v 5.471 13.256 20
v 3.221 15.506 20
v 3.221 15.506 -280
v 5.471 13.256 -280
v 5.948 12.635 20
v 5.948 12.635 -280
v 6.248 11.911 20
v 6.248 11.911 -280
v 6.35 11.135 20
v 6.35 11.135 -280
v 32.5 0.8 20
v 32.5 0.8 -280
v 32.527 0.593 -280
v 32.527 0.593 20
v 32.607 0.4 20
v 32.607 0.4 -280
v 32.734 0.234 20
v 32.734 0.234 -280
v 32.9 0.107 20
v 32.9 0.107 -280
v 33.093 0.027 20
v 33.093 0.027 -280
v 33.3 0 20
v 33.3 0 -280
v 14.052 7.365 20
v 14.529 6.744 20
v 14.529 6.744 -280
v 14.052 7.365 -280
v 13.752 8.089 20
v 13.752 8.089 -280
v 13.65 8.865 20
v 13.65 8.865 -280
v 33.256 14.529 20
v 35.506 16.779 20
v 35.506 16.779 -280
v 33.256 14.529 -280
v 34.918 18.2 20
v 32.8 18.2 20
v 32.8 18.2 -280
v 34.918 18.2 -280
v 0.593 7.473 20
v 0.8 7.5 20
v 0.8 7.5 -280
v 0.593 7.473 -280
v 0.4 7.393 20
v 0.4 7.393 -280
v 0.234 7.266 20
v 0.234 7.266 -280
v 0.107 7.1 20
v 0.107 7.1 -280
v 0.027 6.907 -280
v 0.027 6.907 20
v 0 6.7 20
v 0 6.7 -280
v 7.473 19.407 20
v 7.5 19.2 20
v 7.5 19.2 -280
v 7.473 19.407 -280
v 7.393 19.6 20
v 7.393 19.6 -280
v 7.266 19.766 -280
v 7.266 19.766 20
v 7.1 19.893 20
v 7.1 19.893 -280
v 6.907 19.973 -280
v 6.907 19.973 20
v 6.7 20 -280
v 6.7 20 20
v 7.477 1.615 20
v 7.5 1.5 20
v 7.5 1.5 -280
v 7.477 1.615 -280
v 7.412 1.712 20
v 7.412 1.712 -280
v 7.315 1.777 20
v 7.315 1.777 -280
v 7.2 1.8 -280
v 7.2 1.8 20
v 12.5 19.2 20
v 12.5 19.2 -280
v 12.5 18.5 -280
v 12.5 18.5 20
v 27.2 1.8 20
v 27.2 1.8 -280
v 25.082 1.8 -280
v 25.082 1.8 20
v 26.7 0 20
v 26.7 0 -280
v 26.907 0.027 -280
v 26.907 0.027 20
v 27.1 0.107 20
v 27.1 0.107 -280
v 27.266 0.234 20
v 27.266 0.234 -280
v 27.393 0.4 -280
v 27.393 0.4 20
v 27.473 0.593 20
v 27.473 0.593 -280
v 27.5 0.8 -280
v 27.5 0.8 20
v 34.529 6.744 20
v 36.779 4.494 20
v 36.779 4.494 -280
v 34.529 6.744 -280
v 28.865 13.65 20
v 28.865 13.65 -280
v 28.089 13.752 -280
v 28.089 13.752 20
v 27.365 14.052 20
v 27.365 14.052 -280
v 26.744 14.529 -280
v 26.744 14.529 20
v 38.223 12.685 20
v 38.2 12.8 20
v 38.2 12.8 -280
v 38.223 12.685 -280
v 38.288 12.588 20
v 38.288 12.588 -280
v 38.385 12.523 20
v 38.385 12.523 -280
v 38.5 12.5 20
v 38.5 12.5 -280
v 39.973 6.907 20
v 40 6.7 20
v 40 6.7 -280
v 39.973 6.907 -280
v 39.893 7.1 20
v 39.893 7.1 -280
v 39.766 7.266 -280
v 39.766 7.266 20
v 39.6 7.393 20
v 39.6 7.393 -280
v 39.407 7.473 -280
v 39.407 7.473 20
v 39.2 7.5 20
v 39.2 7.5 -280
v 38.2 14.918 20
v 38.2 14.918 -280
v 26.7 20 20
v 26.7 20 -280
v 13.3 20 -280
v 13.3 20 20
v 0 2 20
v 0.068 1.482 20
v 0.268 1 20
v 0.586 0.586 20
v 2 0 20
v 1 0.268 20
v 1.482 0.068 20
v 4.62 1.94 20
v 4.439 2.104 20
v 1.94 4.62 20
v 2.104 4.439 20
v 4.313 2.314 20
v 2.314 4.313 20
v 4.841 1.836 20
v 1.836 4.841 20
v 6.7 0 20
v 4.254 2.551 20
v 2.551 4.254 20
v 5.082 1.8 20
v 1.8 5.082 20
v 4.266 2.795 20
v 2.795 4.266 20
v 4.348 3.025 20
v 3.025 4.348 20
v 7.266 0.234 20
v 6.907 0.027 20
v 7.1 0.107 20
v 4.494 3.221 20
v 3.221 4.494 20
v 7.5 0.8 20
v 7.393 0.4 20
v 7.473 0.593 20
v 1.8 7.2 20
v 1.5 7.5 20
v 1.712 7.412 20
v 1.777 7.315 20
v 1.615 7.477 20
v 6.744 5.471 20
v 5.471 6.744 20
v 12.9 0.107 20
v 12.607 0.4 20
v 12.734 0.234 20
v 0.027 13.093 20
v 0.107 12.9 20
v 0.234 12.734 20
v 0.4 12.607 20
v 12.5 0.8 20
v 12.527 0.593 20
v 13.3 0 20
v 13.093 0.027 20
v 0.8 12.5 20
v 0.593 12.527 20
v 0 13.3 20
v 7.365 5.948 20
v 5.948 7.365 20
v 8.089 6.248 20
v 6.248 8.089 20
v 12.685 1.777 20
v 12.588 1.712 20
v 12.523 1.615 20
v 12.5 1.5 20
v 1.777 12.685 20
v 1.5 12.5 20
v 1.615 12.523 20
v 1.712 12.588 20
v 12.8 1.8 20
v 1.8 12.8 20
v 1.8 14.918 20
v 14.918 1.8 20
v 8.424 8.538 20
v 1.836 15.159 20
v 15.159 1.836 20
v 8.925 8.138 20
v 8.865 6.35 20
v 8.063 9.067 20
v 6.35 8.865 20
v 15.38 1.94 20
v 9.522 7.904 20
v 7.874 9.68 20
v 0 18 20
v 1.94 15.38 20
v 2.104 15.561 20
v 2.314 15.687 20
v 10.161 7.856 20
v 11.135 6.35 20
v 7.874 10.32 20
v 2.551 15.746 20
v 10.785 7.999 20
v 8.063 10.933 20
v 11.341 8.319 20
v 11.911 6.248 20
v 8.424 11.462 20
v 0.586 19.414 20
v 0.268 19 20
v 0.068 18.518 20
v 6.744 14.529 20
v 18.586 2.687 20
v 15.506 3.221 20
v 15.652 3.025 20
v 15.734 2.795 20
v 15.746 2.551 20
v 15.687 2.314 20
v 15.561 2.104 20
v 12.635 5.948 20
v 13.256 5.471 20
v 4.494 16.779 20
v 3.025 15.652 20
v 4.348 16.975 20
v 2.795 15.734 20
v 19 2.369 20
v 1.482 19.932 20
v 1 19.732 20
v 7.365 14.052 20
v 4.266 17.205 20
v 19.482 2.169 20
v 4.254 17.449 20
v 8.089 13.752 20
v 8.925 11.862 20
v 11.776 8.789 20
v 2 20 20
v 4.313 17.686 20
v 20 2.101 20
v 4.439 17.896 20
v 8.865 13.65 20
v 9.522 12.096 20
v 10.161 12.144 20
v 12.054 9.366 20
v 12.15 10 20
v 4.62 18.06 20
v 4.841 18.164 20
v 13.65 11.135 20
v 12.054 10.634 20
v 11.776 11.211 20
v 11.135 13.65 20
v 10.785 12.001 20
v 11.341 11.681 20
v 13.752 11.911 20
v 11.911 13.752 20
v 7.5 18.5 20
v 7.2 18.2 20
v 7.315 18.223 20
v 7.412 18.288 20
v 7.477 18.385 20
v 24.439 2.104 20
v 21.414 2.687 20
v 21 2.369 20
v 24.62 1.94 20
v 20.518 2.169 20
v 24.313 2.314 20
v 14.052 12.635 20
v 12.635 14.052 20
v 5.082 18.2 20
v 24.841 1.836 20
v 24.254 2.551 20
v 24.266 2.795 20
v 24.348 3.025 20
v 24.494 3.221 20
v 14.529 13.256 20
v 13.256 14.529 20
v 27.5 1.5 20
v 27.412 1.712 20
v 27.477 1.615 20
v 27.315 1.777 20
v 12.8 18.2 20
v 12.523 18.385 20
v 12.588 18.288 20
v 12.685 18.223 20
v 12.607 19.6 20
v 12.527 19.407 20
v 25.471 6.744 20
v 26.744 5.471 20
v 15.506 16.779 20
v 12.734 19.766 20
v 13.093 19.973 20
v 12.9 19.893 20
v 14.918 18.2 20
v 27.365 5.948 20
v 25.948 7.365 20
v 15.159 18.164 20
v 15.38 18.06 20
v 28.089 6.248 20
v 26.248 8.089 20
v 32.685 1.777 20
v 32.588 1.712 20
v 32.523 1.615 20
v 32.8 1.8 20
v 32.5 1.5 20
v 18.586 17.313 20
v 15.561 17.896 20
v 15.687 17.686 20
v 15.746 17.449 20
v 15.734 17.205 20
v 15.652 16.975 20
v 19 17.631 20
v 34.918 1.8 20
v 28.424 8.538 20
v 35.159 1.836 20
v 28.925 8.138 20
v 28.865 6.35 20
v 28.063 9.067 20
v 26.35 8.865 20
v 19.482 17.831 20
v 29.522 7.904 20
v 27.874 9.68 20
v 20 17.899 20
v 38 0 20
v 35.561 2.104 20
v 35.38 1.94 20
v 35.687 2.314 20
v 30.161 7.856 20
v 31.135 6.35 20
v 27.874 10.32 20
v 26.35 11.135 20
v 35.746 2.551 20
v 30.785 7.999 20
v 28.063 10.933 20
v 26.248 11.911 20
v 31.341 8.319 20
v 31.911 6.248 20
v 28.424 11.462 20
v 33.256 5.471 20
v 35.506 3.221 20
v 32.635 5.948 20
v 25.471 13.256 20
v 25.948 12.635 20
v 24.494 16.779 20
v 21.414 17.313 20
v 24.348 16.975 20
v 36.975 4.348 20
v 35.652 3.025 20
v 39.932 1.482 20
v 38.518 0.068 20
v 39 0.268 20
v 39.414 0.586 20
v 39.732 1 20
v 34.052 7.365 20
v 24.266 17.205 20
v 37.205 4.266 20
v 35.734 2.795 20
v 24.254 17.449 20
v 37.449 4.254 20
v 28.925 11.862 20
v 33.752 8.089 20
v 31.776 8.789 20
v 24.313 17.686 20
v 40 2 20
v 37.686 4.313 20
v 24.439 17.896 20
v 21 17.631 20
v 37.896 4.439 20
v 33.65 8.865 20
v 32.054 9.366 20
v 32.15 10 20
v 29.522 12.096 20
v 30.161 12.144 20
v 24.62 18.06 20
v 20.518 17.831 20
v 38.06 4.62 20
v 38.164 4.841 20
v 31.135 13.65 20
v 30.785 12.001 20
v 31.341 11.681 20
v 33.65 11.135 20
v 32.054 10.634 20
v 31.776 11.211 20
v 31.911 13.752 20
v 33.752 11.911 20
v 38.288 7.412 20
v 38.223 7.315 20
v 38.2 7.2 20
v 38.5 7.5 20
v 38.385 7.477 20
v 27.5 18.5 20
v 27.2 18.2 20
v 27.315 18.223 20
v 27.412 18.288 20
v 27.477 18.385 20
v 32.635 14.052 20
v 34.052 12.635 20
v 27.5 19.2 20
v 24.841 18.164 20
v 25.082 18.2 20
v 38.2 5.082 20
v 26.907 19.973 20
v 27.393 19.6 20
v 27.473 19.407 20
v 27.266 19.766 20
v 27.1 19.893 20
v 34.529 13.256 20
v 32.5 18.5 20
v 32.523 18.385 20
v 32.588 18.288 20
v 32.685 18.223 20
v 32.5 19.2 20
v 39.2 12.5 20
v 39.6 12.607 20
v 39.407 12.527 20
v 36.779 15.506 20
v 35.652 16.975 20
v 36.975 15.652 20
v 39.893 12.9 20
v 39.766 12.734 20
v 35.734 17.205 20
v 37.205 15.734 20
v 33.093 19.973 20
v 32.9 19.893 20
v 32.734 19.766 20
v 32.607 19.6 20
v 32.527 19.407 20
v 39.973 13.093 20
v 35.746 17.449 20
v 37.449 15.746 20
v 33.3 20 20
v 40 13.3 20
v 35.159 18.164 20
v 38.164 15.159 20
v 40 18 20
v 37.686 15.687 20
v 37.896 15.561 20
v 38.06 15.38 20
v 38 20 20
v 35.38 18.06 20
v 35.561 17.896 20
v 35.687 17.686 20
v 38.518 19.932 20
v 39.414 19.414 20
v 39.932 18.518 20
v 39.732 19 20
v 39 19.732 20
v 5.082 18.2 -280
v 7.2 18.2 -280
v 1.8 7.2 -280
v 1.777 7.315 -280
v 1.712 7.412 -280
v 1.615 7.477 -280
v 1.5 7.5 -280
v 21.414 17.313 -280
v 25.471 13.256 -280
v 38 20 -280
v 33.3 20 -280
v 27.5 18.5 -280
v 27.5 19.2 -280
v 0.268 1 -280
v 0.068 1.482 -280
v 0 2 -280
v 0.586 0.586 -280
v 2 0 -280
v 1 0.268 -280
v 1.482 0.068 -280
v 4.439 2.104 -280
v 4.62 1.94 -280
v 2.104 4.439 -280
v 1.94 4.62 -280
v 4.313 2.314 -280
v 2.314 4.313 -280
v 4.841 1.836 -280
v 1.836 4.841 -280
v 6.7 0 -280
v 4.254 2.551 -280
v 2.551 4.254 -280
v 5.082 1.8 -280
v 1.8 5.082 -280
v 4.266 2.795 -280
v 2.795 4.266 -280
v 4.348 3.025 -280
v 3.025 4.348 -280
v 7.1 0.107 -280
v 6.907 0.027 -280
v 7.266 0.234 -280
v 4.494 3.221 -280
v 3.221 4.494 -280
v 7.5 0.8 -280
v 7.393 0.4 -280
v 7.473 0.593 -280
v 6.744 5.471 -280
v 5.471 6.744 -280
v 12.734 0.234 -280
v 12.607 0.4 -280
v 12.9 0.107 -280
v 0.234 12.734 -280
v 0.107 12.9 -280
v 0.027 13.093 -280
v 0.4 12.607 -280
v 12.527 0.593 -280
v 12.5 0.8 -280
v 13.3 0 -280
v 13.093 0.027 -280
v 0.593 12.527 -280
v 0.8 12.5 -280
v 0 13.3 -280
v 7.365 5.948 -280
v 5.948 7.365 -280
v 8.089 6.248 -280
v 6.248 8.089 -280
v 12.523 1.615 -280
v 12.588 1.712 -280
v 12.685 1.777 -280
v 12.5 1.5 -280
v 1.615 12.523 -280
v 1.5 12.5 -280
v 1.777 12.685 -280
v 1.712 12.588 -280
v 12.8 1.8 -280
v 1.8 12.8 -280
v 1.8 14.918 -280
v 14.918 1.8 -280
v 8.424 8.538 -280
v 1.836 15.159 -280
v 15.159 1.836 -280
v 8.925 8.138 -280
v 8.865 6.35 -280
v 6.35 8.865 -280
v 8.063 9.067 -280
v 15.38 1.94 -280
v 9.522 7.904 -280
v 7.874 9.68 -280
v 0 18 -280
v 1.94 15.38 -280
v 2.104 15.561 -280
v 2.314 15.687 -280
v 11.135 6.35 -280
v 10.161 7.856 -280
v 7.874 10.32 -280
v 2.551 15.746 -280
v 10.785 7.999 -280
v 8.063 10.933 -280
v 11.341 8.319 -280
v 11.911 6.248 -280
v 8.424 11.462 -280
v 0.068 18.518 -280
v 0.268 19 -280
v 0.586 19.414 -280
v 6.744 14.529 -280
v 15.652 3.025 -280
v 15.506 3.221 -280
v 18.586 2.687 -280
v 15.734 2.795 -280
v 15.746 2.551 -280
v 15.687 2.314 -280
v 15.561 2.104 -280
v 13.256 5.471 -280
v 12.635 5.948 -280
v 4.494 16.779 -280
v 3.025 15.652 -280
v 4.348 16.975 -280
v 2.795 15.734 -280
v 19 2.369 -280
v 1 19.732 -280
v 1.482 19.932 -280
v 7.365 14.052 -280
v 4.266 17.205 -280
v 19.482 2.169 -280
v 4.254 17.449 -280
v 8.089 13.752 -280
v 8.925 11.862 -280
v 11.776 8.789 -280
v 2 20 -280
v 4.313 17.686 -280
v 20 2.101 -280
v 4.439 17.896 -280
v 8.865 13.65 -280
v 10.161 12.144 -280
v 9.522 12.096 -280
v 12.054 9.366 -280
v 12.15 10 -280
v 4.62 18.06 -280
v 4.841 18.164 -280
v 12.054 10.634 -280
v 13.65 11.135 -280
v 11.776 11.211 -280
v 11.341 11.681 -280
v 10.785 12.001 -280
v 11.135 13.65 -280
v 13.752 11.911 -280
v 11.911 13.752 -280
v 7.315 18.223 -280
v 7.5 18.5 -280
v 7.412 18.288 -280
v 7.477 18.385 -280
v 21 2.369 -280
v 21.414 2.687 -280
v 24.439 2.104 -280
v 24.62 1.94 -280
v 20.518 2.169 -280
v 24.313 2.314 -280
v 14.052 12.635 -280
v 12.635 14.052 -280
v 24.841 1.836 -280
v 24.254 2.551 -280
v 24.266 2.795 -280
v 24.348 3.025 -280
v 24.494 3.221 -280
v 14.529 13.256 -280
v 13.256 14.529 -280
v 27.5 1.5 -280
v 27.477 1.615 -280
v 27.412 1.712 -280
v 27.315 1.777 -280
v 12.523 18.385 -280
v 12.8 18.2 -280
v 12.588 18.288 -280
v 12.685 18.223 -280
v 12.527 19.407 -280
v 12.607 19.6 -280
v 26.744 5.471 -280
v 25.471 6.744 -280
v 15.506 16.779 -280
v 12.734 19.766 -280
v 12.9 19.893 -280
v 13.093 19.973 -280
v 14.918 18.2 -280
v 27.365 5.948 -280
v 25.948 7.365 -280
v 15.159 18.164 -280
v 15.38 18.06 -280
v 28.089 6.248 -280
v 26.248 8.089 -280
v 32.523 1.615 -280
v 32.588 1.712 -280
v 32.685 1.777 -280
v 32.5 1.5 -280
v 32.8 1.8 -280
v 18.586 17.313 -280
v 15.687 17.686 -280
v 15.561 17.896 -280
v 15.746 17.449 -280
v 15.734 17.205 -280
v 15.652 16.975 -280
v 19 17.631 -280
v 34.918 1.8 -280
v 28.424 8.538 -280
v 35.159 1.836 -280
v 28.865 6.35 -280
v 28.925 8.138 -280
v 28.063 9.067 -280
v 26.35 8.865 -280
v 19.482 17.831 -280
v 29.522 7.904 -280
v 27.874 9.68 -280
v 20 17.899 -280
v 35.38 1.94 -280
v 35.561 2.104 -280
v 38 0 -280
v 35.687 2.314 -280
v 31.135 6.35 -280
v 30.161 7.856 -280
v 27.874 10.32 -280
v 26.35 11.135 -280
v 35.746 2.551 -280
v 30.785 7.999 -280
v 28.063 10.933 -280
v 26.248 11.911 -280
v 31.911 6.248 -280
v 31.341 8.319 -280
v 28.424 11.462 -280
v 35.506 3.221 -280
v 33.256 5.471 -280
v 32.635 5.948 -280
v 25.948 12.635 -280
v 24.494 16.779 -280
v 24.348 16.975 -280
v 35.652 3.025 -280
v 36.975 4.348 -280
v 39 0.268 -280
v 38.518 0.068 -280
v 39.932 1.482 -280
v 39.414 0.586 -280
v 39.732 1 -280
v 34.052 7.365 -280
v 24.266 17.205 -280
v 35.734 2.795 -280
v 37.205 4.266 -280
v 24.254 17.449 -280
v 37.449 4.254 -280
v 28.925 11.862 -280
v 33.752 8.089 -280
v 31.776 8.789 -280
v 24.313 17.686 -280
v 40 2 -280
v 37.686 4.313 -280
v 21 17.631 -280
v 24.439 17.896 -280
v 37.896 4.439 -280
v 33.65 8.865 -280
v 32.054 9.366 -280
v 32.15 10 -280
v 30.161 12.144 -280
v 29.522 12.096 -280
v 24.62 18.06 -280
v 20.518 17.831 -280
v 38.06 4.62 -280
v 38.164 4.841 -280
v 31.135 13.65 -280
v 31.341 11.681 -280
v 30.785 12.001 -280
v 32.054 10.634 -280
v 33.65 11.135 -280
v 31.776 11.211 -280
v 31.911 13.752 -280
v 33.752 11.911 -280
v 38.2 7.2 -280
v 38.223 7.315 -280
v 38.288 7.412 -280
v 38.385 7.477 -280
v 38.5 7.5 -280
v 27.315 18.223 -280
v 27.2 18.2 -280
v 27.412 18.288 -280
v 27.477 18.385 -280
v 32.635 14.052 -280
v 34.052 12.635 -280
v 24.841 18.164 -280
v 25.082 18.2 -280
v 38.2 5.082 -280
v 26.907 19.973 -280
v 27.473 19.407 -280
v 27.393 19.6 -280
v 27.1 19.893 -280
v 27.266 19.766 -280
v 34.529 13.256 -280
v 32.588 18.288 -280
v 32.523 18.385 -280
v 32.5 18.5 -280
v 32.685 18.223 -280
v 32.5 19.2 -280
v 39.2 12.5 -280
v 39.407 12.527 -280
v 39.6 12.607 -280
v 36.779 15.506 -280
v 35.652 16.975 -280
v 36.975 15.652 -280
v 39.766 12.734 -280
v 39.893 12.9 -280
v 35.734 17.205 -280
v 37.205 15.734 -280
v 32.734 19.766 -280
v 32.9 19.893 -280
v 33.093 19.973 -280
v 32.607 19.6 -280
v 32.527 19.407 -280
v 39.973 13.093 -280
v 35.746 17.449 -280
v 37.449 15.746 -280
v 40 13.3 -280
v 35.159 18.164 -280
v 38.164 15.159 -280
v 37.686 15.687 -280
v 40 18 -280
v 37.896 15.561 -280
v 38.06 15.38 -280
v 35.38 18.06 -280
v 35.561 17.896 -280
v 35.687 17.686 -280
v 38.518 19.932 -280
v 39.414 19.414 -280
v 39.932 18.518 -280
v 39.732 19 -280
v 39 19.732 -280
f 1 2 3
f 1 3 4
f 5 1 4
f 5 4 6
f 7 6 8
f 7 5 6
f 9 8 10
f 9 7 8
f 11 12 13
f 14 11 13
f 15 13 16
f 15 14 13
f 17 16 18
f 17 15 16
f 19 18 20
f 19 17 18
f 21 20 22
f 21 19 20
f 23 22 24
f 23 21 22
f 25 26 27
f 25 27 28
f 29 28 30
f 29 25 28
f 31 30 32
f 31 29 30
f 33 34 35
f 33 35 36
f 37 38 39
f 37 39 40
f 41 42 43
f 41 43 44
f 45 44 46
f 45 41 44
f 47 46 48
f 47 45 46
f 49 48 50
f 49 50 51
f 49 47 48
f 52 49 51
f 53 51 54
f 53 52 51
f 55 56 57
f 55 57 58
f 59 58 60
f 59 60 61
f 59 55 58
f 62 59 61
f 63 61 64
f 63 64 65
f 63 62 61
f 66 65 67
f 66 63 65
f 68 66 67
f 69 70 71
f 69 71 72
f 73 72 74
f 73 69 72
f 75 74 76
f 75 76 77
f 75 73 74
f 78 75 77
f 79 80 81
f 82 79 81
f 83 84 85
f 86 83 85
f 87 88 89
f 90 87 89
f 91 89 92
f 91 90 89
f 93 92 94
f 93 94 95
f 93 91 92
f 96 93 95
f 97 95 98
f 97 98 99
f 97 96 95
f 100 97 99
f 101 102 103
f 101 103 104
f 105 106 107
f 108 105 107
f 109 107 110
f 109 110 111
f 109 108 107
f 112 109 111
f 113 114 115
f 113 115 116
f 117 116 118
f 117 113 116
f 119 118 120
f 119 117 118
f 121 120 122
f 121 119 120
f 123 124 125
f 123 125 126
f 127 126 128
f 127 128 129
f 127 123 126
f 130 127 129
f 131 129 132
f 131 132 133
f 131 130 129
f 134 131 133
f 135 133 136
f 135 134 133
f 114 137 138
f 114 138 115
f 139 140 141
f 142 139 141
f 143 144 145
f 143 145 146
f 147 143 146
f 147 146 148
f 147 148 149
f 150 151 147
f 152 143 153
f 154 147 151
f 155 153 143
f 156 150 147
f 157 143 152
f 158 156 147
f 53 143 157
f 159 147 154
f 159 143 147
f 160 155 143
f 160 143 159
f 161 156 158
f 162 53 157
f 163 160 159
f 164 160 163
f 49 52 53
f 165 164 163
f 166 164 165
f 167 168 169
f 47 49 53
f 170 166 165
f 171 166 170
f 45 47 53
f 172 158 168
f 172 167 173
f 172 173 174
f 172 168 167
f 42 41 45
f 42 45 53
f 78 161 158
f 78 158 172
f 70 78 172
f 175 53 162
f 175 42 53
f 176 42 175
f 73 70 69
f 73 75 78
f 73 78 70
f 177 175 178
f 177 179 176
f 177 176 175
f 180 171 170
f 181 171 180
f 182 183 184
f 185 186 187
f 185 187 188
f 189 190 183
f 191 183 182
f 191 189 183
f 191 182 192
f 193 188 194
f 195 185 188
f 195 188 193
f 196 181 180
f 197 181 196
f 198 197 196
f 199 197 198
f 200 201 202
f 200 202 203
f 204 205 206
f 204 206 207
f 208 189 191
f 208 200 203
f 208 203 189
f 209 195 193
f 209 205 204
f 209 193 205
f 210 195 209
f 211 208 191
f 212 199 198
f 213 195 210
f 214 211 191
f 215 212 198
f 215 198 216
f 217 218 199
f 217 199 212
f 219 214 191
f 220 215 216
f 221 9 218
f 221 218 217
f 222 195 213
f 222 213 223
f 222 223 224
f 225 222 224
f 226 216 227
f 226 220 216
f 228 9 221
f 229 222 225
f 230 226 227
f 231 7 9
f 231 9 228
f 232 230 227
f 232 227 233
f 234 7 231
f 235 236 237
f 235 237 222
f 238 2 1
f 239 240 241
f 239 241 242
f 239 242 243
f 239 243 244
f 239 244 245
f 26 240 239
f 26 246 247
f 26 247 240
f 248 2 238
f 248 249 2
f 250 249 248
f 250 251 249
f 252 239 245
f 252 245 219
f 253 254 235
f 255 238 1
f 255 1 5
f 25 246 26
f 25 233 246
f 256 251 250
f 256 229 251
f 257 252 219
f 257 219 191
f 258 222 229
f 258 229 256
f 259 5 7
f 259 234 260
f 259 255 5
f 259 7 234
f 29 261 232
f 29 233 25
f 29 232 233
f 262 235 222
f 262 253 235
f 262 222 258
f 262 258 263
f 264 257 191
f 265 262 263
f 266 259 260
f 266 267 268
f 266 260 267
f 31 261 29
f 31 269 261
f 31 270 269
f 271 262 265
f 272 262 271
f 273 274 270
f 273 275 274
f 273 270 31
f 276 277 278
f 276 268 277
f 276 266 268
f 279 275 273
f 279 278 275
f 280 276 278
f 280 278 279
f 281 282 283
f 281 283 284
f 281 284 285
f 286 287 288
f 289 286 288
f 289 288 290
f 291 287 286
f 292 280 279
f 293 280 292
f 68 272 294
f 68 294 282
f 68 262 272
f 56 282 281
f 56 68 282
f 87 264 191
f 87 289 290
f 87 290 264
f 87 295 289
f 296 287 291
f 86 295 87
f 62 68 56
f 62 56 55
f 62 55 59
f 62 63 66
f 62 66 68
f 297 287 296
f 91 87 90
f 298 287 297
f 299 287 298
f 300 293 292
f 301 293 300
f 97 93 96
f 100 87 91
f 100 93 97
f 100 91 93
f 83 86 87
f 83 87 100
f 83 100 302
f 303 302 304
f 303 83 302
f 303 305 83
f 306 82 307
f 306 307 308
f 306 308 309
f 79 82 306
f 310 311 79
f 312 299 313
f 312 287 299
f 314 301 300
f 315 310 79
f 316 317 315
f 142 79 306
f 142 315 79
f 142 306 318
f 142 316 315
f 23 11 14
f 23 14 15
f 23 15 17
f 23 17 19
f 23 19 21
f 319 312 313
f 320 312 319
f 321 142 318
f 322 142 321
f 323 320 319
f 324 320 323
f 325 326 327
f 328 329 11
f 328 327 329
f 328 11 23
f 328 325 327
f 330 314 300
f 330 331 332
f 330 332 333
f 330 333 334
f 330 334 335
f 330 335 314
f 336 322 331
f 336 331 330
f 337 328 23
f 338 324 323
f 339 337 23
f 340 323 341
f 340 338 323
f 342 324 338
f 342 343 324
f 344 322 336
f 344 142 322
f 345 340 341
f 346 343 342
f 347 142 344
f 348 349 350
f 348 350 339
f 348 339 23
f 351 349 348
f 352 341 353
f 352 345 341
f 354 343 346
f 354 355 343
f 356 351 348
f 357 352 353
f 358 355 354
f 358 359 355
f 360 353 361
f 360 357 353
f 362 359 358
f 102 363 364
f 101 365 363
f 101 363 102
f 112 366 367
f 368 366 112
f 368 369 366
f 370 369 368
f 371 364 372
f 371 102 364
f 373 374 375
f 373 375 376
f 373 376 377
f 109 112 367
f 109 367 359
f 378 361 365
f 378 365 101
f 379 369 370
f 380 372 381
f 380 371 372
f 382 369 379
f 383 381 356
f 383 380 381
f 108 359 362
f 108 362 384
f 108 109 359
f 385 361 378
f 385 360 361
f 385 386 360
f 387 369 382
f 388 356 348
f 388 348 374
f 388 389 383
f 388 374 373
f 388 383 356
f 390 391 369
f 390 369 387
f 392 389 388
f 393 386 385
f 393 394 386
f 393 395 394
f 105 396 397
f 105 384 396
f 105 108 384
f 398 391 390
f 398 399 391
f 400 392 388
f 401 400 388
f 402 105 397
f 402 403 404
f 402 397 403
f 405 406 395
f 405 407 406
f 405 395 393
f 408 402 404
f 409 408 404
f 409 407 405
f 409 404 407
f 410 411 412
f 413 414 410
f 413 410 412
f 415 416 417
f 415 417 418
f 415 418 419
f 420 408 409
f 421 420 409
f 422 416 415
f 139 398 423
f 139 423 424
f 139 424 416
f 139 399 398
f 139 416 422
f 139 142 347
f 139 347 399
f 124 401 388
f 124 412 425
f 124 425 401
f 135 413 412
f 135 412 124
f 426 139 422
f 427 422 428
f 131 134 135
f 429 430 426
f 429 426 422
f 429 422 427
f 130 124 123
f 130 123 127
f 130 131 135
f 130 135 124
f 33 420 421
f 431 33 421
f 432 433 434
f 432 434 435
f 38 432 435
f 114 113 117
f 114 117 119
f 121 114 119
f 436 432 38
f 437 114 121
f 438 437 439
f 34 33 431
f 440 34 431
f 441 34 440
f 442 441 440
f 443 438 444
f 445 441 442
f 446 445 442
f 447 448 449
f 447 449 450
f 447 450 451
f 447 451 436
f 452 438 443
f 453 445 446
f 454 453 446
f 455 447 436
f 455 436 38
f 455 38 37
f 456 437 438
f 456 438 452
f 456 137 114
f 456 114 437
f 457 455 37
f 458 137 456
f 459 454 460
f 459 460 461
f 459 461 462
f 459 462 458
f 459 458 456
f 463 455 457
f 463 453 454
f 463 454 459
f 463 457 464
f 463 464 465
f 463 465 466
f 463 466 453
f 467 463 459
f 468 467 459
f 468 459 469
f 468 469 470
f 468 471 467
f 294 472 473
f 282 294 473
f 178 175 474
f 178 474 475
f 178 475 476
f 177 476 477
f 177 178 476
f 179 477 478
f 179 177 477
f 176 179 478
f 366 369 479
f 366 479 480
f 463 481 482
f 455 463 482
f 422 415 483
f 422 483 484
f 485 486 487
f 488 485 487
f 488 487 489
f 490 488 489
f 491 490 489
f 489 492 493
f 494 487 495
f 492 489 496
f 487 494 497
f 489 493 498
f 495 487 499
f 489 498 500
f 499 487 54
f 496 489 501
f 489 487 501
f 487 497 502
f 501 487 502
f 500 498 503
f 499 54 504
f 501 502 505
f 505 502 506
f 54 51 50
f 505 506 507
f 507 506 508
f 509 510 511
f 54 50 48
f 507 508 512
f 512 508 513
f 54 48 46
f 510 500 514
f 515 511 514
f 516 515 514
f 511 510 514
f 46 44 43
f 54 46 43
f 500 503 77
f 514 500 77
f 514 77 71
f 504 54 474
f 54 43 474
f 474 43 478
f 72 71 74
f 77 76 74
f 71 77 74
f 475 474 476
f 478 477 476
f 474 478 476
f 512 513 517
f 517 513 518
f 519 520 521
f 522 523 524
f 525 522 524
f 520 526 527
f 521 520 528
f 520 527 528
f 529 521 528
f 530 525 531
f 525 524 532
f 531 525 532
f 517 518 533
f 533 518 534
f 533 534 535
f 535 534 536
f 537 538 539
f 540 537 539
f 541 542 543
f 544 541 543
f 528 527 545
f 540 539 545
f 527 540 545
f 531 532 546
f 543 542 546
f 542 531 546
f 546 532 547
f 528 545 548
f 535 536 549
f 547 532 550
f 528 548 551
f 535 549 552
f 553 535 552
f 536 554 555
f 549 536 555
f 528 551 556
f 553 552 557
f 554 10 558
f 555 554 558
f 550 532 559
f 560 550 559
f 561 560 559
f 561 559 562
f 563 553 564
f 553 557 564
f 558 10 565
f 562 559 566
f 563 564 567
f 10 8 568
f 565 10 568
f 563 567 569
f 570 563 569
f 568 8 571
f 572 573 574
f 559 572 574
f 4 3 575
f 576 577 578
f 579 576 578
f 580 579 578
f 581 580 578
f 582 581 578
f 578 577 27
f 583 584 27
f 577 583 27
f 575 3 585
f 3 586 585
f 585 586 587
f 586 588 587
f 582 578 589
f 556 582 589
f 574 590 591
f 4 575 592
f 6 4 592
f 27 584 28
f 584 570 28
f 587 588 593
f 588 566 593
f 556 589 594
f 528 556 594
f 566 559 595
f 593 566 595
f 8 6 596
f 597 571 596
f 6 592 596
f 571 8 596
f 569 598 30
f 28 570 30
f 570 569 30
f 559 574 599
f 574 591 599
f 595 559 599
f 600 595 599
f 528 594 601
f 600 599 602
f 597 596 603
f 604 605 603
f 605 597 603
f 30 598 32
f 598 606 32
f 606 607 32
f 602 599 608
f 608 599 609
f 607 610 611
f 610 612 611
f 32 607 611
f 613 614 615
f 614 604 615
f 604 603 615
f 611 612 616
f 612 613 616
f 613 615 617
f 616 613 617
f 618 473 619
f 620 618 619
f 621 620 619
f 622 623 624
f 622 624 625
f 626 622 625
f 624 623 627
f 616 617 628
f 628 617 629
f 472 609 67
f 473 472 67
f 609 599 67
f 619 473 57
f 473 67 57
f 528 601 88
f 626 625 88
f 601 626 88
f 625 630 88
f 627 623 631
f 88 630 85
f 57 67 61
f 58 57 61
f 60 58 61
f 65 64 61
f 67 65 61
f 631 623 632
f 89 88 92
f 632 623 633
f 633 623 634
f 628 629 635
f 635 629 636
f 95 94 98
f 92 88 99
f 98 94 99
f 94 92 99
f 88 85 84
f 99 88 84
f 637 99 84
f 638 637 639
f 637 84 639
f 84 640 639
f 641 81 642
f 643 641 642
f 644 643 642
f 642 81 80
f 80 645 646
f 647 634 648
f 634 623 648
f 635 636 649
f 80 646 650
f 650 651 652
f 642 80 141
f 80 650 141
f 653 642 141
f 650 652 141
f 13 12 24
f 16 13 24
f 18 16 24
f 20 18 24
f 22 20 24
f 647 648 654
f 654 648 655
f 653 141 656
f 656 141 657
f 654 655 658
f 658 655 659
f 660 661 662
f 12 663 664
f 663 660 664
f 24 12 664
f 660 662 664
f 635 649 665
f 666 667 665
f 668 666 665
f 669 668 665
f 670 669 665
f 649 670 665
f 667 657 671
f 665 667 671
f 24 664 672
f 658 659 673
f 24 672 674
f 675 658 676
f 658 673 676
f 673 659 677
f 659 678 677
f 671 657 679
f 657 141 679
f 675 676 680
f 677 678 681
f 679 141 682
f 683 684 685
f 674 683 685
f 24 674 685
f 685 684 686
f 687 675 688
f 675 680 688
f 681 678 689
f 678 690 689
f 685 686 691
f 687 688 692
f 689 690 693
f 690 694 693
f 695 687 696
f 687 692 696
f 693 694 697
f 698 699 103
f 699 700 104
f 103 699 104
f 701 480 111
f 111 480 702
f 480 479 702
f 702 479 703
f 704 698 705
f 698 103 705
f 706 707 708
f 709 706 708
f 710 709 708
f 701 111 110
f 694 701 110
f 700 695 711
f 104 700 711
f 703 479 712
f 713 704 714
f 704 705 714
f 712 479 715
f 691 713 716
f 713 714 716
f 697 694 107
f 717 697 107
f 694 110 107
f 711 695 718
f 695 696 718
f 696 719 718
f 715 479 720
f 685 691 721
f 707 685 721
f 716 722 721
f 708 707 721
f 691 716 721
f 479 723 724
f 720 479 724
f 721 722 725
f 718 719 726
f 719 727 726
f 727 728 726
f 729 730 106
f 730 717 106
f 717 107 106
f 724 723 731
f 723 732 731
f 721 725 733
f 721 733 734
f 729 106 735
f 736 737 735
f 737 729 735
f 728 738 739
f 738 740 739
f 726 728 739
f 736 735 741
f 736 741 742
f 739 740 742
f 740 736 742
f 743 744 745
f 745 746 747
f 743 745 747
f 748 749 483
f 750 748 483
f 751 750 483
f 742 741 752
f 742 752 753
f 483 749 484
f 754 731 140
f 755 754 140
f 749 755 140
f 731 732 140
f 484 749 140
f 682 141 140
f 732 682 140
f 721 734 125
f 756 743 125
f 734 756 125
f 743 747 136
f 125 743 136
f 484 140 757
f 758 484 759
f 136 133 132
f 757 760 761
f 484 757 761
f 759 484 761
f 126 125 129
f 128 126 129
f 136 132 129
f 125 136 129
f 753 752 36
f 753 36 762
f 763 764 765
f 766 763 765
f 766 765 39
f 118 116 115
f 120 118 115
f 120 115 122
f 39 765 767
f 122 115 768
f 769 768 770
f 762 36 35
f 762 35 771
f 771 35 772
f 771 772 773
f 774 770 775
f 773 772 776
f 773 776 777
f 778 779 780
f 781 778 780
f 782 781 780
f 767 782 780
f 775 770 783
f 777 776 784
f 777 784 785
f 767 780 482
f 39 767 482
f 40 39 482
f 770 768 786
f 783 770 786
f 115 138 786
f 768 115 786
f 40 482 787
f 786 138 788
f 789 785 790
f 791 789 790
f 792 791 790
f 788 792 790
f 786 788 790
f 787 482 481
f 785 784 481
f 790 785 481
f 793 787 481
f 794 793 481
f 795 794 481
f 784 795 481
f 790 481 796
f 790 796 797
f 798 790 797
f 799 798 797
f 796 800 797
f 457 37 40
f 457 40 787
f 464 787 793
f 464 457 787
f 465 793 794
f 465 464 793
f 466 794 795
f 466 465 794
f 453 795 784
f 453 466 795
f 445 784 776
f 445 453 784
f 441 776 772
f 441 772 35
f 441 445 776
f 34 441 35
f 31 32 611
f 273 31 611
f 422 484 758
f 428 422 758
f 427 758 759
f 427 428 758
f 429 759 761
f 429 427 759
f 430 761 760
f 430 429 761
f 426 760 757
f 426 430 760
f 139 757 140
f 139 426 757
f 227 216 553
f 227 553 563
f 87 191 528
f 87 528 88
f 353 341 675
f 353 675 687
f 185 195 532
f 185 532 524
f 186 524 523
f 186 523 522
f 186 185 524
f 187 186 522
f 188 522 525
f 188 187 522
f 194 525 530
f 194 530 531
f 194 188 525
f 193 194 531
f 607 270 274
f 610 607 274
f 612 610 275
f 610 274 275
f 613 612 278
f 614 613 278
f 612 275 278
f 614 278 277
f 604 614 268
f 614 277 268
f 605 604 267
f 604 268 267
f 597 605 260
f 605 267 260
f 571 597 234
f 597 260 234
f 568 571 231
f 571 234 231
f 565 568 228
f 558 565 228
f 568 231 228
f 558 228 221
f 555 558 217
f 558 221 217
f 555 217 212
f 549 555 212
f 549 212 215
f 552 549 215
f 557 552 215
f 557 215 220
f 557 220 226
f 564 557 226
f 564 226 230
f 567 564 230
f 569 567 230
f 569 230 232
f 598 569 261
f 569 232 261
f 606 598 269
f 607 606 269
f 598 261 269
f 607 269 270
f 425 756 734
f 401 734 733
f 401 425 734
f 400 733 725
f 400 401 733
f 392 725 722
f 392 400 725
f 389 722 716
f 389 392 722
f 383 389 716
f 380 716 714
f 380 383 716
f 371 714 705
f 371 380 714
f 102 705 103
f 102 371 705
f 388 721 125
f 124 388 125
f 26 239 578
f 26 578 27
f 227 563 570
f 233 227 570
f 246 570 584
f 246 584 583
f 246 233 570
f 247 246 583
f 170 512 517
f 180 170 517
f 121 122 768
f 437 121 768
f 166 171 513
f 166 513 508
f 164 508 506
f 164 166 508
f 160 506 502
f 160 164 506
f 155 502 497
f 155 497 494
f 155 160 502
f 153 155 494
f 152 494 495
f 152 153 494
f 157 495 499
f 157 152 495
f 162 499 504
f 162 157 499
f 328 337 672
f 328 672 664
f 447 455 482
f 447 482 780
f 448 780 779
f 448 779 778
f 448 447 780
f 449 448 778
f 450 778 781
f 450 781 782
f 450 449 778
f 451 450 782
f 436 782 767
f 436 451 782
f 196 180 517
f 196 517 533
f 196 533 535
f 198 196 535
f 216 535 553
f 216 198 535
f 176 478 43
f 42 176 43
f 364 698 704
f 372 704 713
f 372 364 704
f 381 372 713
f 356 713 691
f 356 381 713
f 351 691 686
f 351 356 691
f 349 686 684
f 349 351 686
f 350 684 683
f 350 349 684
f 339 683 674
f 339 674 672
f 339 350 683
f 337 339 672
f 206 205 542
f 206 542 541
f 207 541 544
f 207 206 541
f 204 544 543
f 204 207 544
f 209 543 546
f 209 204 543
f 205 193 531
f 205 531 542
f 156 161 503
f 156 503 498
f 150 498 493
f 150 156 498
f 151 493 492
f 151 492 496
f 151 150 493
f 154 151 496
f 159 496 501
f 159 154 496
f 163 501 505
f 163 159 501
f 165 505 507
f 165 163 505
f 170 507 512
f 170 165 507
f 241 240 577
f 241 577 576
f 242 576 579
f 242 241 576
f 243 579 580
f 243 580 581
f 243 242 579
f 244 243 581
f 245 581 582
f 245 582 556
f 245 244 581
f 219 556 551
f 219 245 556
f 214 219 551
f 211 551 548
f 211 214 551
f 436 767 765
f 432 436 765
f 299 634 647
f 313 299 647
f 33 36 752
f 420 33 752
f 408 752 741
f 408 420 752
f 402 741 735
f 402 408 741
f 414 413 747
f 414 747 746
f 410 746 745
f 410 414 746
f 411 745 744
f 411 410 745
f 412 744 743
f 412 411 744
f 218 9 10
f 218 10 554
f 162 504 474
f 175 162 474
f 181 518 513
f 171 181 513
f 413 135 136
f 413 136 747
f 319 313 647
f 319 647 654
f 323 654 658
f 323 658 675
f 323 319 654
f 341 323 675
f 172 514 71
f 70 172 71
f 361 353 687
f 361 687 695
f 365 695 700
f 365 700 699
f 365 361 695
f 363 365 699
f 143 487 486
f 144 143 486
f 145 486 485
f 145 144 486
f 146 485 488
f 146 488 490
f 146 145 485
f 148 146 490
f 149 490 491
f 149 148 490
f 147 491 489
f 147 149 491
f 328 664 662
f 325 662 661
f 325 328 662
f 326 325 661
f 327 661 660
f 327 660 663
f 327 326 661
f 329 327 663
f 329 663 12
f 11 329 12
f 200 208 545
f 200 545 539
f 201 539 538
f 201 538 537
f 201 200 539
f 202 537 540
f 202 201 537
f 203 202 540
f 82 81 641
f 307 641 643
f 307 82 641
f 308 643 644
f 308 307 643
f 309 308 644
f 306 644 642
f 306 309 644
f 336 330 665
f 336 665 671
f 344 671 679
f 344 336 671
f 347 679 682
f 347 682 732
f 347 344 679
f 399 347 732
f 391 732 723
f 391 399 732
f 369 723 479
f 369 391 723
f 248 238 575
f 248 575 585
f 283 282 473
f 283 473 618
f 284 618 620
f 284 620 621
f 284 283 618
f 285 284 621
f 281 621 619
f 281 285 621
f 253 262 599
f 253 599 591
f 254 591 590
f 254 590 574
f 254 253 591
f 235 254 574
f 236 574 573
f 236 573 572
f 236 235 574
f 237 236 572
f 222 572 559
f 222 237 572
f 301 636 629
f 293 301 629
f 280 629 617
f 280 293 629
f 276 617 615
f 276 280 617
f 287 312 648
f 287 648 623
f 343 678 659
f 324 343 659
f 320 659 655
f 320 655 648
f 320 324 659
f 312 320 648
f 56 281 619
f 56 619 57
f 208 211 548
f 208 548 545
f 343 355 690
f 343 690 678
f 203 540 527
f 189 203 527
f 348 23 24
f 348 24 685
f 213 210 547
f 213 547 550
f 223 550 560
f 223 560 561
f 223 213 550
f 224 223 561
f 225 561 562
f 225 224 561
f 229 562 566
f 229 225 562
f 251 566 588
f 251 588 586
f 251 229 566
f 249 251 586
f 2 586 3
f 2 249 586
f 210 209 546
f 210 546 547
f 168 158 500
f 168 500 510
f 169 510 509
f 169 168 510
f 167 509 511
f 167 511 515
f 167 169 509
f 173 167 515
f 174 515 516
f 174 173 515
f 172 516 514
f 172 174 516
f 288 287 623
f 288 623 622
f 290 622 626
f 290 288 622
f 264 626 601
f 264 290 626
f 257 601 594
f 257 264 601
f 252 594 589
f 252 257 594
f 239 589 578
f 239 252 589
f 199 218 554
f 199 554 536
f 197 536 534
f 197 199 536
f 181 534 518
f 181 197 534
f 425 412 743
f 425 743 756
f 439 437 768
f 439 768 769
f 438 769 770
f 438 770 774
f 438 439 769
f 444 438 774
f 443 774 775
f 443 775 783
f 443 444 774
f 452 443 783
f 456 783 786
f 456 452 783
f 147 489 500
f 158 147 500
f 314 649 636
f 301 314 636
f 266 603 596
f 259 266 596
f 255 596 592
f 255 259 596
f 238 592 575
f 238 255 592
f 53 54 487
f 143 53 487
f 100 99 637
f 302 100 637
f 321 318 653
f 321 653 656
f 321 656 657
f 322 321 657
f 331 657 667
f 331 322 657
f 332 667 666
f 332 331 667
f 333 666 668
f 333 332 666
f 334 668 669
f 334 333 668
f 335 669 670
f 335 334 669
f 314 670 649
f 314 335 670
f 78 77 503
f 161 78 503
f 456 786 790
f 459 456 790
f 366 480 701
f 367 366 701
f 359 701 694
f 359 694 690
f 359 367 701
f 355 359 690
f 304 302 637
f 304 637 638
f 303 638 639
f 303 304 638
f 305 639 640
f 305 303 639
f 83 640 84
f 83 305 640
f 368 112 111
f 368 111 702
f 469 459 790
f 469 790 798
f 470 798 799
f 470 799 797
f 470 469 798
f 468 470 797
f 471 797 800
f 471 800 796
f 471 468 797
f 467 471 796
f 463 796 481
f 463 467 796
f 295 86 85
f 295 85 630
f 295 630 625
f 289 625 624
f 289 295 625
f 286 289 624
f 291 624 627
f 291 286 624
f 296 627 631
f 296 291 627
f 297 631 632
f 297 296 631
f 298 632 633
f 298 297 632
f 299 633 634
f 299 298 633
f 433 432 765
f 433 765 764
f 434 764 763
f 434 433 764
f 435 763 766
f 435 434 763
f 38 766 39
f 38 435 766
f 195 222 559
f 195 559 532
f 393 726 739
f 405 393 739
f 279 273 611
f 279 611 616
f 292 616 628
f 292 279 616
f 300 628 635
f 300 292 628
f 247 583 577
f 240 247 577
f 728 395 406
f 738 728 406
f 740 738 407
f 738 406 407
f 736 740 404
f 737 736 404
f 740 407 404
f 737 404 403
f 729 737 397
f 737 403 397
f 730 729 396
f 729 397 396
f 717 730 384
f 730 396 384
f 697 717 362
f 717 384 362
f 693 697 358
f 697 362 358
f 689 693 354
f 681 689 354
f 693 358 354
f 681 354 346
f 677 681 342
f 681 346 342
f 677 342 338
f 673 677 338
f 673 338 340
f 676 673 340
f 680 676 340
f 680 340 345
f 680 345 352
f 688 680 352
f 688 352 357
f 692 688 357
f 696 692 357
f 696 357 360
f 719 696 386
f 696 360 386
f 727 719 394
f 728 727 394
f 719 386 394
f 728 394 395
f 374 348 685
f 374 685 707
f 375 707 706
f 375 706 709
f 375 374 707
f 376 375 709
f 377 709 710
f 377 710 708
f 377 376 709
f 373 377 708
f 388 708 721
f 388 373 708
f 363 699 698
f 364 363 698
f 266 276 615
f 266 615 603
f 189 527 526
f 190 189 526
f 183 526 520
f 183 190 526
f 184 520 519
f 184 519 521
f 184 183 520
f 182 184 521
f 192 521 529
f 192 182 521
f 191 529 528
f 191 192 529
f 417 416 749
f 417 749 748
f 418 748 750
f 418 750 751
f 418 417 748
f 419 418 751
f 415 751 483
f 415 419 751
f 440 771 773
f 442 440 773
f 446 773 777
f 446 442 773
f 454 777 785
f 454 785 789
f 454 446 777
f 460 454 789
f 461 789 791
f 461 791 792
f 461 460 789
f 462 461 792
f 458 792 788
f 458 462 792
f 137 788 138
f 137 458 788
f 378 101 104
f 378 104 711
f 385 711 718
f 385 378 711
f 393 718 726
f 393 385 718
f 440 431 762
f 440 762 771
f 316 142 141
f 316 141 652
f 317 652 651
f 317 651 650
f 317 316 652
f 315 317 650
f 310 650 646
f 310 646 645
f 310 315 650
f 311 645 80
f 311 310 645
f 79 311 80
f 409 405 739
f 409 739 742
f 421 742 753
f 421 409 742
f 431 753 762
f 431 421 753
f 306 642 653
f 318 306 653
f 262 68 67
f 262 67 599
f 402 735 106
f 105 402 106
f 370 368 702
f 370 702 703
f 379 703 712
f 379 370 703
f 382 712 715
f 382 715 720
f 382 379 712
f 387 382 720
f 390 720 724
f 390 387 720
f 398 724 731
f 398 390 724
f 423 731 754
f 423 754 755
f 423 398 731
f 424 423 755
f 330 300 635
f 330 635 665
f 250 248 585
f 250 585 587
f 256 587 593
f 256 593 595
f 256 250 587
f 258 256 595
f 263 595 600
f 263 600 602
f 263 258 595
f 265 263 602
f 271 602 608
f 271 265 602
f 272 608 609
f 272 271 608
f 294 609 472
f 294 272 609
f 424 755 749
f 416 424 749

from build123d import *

# Parameters (mm, degrees)
SKIZZE1_R                       = 2.15
AUFSATZ_LINEAR_AUSTRAGEN1_DEPTH = 300


with BuildPart() as part:
    # Skizze1 → Aufsatz-Linear austragen1 (new body)
    with BuildSketch(Plane.XY.offset(20)):
        with BuildLine():
            Line((32.499999987, 1.499999997), (32.499999987, 0.800000002))
            ThreePointArc((32.499999987, 0.800000002), (32.734314563, 0.234314576), (33.29999999, 0))
            Line((33.29999999, 0), (38, 0))
            ThreePointArc((38, 0), (39.414213562, 0.585786438), (40, 2))
            Line((40, 2), (40, 6.700000003))
            ThreePointArc((40, 6.700000003), (39.765685425, 7.265685427), (39.2, 7.500000003))
            Line((39.2, 7.500000003), (38.499999994, 7.500000003))
            ThreePointArc((38.499999994, 7.500000003), (38.28786796, 7.412132037), (38.199999994, 7.200000003))
            Line((38.199999994, 7.200000003), (38.199999994, 5.082411608))
            ThreePointArc((38.199999994, 5.082411608), (37.686138516, 4.313363559), (36.77898449, 4.493807714))
            Line((36.77898449, 4.493807714), (34.52867965, 6.744112554))
            ThreePointArc((34.52867965, 6.744112554), (33.878361397, 7.717382599), (33.649999994, 8.865432896))
            Line((33.649999994, 8.865432896), (33.649999994, 11.134567107))
            ThreePointArc((33.649999994, 11.134567107), (33.878361397, 12.282617403), (34.52867965, 13.255887448))
            Line((34.52867965, 13.255887448), (36.778984494, 15.506192293))
            ThreePointArc((36.778984494, 15.506192293), (37.686138518, 15.686636447), (38.199999994, 14.9175884))
            Line((38.199999994, 14.9175884), (38.199999994, 12.800000003))
            ThreePointArc((38.199999994, 12.800000003), (38.287867961, 12.587867967), (38.499999997, 12.5))
            Line((38.499999997, 12.5), (39.199999998, 12.5))
            ThreePointArc((39.199999998, 12.5), (39.765685424, 12.734314576), (40, 13.300000002))
            Line((40, 13.300000002), (40, 18))
            ThreePointArc((40, 18), (39.414213562, 19.414213562), (38, 20))
            Line((38, 20), (33.299999987, 20))
            ThreePointArc((33.299999987, 20), (32.734314562, 19.765685425), (32.499999987, 19.2))
            Line((32.499999987, 19.2), (32.499999987, 18.499999997))
            ThreePointArc((32.499999987, 18.499999997), (32.587867953, 18.287867963), (32.799999987, 18.199999997))
            Line((32.799999987, 18.199999997), (34.917587987, 18.199999997))
            ThreePointArc((34.917587987, 18.199999997), (35.686635928, 17.686138591), (35.506191799, 16.778984692))
            Line((35.506191799, 16.778984692), (33.255886765, 14.528679659))
            ThreePointArc((33.255886765, 14.528679659), (32.28261672, 13.878361405), (31.134566423, 13.650000003))
            Line((31.134566423, 13.650000003), (28.865432887, 13.650000003))
            ThreePointArc((28.865432887, 13.650000003), (27.717382591, 13.878361405), (26.744112545, 14.528679659))
            Line((26.744112545, 14.528679659), (24.493807705, 16.778984499))
            ThreePointArc((24.493807705, 16.778984499), (24.313363551, 17.686138521), (25.082411597, 18.199999997))
            Line((25.082411597, 18.199999997), (27.199999997, 18.199999997))
            ThreePointArc((27.199999997, 18.199999997), (27.412132033, 18.287867964), (27.5, 18.5))
            Line((27.5, 18.5), (27.5, 19.199999998))
            ThreePointArc((27.5, 19.199999998), (27.265685424, 19.765685424), (26.699999998, 20))
            Line((26.699999998, 20), (13.299999987, 20))
            ThreePointArc((13.299999987, 20), (12.734314562, 19.765685425), (12.499999987, 19.2))
            Line((12.499999987, 19.2), (12.499999987, 18.499999997))
            ThreePointArc((12.499999987, 18.499999997), (12.587867953, 18.287867963), (12.799999987, 18.199999997))
            Line((12.799999987, 18.199999997), (14.917588393, 18.199999997))
            ThreePointArc((14.917588393, 18.199999997), (15.686636443, 17.686138519), (15.506192288, 16.778984492))
            Line((15.506192288, 16.778984492), (13.255887455, 14.528679659))
            ThreePointArc((13.255887455, 14.528679659), (12.282617409, 13.878361405), (11.134567113, 13.650000003))
            Line((11.134567113, 13.650000003), (8.865432887, 13.650000003))
            ThreePointArc((8.865432887, 13.650000003), (7.717382591, 13.878361405), (6.744112545, 14.528679659))
            Line((6.744112545, 14.528679659), (4.493807705, 16.778984499))
            ThreePointArc((4.493807705, 16.778984499), (4.313363551, 17.686138521), (5.082411597, 18.199999997))
            Line((5.082411597, 18.199999997), (7.199999997, 18.199999997))
            ThreePointArc((7.199999997, 18.199999997), (7.412132033, 18.287867964), (7.5, 18.5))
            Line((7.5, 18.5), (7.5, 19.199999998))
            ThreePointArc((7.5, 19.199999998), (7.265685424, 19.765685424), (6.699999997, 20))
            Line((6.699999997, 20), (2, 20))
            ThreePointArc((2, 20), (0.585786438, 19.414213562), (0, 18))
            Line((0, 18), (0, 13.3))
            ThreePointArc((0, 13.3), (0.234314575, 12.734314575), (0.8, 12.5))
            Line((0.8, 12.5), (1.500000005, 12.5))
            ThreePointArc((1.500000005, 12.5), (1.71213204, 12.587867966), (1.800000005, 12.8))
            Line((1.800000005, 12.8), (1.800000005, 14.91758839))
            ThreePointArc((1.800000005, 14.91758839), (2.313861483, 15.686636439), (3.22101551, 15.506192284))
            Line((3.22101551, 15.506192284), (5.471320344, 13.25588745))
            ThreePointArc((5.471320344, 13.25588745), (6.121638597, 12.282617404), (6.35, 11.134567108))
            Line((6.35, 11.134567108), (6.35, 8.86543289))
            ThreePointArc((6.35, 8.86543289), (6.121638597, 7.717382593), (5.471320344, 6.744112548))
            Line((5.471320344, 6.744112548), (3.221015504, 4.493807708))
            ThreePointArc((3.221015504, 4.493807708), (2.313861481, 4.313363554), (1.800000005, 5.0824116))
            Line((1.800000005, 5.0824116), (1.800000005, 7.2))
            ThreePointArc((1.800000005, 7.2), (1.712132039, 7.412132036), (1.500000003, 7.500000003))
            Line((1.500000003, 7.500000003), (0.800000003, 7.500000002))
            ThreePointArc((0.800000003, 7.500000002), (0.234314576, 7.265685427), (0, 6.7))
            Line((0, 6.7), (0, 2))
            ThreePointArc((0, 2), (0.585786438, 0.585786438), (2, 0))
            Line((2, 0), (6.7, 0))
            ThreePointArc((6.7, 0), (7.265685425, 0.234314575), (7.5, 0.8))
            Line((7.5, 0.8), (7.5, 1.5))
            ThreePointArc((7.5, 1.5), (7.412132034, 1.712132034), (7.2, 1.8))
            Line((7.2, 1.8), (5.0824116, 1.8))
            ThreePointArc((5.0824116, 1.8), (4.313363551, 2.313861478), (4.493807706, 3.221015504))
            Line((4.493807706, 3.221015504), (6.744112546, 5.471320344))
            ThreePointArc((6.744112546, 5.471320344), (7.717382592, 6.121638598), (8.865432888, 6.35))
            Line((8.865432888, 6.35), (11.134567107, 6.35))
            ThreePointArc((11.134567107, 6.35), (12.282617403, 6.121638598), (13.255887449, 5.471320344))
            Line((13.255887449, 5.471320344), (15.506192293, 3.2210155))
            ThreePointArc((15.506192293, 3.2210155), (15.686636447, 2.313861477), (14.9175884, 1.8))
            Line((14.9175884, 1.8), (12.79999999, 1.8))
            ThreePointArc((12.79999999, 1.8), (12.587867954, 1.712132033), (12.499999987, 1.499999997))
            Line((12.499999987, 1.499999997), (12.499999987, 0.800000002))
            ThreePointArc((12.499999987, 0.800000002), (12.734314563, 0.234314576), (13.29999999, 0))
            Line((13.29999999, 0), (26.7, 0))
            ThreePointArc((26.7, 0), (27.265685425, 0.234314575), (27.5, 0.8))
            Line((27.5, 0.8), (27.5, 1.5))
            ThreePointArc((27.5, 1.5), (27.412132034, 1.712132034), (27.2, 1.8))
            Line((27.2, 1.8), (25.0824116, 1.8))
            ThreePointArc((25.0824116, 1.8), (24.313363551, 2.313861478), (24.493807706, 3.221015504))
            Line((24.493807706, 3.221015504), (26.744112546, 5.471320344))
            ThreePointArc((26.744112546, 5.471320344), (27.717382592, 6.121638598), (28.865432888, 6.35))
            Line((28.865432888, 6.35), (31.134567114, 6.35))
            ThreePointArc((31.134567114, 6.35), (32.28261741, 6.121638598), (33.255887456, 5.471320344))
            Line((33.255887456, 5.471320344), (35.50619239, 3.22101541))
            ThreePointArc((35.50619239, 3.22101541), (35.686636533, 2.313861444), (34.917588535, 1.8))
            Line((34.917588535, 1.8), (32.79999999, 1.8))
            ThreePointArc((32.79999999, 1.8), (32.587867954, 1.712132033), (32.499999987, 1.499999997))
        make_face()
        with Locations((10, 10)):
            Circle(SKIZZE1_R, mode=Mode.SUBTRACT)
        with Locations((30, 10)):
            Circle(SKIZZE1_R, mode=Mode.SUBTRACT)
        with BuildLine():
            Line((18.585786095, 2.687006109), (14.528679095, 6.744113109))
            ThreePointArc((14.528679095, 6.744113109), (13.878360842, 7.717383154), (13.64999944, 8.86543345))
            Line((13.64999944, 8.86543345), (13.64999944, 11.134566552))
            ThreePointArc((13.64999944, 11.134566552), (13.878360842, 12.282616848), (14.528679095, 13.255886894))
            Line((14.528679095, 13.255886894), (18.585786441, 17.312994239))
            ThreePointArc((18.585786441, 17.312994239), (20.000000001, 17.898780676), (21.414213561, 17.312994239))
            Line((21.414213561, 17.312994239), (25.471320215, 13.255887585))
            ThreePointArc((25.471320215, 13.255887585), (26.121638469, 12.282617539), (26.349999871, 11.134567243))
            Line((26.349999871, 11.134567243), (26.349999871, 8.86543345))
            ThreePointArc((26.349999871, 8.86543345), (26.121638469, 7.717383154), (25.471320215, 6.744113109))
            Line((25.471320215, 6.744113109), (21.414213215, 2.687006109))
            ThreePointArc((21.414213215, 2.687006109), (19.999999655, 2.101219672), (18.585786095, 2.687006109))
        make_face(mode=Mode.SUBTRACT)
    extrude(amount=-AUFSATZ_LINEAR_AUSTRAGEN1_DEPTH)


solid = part.part
